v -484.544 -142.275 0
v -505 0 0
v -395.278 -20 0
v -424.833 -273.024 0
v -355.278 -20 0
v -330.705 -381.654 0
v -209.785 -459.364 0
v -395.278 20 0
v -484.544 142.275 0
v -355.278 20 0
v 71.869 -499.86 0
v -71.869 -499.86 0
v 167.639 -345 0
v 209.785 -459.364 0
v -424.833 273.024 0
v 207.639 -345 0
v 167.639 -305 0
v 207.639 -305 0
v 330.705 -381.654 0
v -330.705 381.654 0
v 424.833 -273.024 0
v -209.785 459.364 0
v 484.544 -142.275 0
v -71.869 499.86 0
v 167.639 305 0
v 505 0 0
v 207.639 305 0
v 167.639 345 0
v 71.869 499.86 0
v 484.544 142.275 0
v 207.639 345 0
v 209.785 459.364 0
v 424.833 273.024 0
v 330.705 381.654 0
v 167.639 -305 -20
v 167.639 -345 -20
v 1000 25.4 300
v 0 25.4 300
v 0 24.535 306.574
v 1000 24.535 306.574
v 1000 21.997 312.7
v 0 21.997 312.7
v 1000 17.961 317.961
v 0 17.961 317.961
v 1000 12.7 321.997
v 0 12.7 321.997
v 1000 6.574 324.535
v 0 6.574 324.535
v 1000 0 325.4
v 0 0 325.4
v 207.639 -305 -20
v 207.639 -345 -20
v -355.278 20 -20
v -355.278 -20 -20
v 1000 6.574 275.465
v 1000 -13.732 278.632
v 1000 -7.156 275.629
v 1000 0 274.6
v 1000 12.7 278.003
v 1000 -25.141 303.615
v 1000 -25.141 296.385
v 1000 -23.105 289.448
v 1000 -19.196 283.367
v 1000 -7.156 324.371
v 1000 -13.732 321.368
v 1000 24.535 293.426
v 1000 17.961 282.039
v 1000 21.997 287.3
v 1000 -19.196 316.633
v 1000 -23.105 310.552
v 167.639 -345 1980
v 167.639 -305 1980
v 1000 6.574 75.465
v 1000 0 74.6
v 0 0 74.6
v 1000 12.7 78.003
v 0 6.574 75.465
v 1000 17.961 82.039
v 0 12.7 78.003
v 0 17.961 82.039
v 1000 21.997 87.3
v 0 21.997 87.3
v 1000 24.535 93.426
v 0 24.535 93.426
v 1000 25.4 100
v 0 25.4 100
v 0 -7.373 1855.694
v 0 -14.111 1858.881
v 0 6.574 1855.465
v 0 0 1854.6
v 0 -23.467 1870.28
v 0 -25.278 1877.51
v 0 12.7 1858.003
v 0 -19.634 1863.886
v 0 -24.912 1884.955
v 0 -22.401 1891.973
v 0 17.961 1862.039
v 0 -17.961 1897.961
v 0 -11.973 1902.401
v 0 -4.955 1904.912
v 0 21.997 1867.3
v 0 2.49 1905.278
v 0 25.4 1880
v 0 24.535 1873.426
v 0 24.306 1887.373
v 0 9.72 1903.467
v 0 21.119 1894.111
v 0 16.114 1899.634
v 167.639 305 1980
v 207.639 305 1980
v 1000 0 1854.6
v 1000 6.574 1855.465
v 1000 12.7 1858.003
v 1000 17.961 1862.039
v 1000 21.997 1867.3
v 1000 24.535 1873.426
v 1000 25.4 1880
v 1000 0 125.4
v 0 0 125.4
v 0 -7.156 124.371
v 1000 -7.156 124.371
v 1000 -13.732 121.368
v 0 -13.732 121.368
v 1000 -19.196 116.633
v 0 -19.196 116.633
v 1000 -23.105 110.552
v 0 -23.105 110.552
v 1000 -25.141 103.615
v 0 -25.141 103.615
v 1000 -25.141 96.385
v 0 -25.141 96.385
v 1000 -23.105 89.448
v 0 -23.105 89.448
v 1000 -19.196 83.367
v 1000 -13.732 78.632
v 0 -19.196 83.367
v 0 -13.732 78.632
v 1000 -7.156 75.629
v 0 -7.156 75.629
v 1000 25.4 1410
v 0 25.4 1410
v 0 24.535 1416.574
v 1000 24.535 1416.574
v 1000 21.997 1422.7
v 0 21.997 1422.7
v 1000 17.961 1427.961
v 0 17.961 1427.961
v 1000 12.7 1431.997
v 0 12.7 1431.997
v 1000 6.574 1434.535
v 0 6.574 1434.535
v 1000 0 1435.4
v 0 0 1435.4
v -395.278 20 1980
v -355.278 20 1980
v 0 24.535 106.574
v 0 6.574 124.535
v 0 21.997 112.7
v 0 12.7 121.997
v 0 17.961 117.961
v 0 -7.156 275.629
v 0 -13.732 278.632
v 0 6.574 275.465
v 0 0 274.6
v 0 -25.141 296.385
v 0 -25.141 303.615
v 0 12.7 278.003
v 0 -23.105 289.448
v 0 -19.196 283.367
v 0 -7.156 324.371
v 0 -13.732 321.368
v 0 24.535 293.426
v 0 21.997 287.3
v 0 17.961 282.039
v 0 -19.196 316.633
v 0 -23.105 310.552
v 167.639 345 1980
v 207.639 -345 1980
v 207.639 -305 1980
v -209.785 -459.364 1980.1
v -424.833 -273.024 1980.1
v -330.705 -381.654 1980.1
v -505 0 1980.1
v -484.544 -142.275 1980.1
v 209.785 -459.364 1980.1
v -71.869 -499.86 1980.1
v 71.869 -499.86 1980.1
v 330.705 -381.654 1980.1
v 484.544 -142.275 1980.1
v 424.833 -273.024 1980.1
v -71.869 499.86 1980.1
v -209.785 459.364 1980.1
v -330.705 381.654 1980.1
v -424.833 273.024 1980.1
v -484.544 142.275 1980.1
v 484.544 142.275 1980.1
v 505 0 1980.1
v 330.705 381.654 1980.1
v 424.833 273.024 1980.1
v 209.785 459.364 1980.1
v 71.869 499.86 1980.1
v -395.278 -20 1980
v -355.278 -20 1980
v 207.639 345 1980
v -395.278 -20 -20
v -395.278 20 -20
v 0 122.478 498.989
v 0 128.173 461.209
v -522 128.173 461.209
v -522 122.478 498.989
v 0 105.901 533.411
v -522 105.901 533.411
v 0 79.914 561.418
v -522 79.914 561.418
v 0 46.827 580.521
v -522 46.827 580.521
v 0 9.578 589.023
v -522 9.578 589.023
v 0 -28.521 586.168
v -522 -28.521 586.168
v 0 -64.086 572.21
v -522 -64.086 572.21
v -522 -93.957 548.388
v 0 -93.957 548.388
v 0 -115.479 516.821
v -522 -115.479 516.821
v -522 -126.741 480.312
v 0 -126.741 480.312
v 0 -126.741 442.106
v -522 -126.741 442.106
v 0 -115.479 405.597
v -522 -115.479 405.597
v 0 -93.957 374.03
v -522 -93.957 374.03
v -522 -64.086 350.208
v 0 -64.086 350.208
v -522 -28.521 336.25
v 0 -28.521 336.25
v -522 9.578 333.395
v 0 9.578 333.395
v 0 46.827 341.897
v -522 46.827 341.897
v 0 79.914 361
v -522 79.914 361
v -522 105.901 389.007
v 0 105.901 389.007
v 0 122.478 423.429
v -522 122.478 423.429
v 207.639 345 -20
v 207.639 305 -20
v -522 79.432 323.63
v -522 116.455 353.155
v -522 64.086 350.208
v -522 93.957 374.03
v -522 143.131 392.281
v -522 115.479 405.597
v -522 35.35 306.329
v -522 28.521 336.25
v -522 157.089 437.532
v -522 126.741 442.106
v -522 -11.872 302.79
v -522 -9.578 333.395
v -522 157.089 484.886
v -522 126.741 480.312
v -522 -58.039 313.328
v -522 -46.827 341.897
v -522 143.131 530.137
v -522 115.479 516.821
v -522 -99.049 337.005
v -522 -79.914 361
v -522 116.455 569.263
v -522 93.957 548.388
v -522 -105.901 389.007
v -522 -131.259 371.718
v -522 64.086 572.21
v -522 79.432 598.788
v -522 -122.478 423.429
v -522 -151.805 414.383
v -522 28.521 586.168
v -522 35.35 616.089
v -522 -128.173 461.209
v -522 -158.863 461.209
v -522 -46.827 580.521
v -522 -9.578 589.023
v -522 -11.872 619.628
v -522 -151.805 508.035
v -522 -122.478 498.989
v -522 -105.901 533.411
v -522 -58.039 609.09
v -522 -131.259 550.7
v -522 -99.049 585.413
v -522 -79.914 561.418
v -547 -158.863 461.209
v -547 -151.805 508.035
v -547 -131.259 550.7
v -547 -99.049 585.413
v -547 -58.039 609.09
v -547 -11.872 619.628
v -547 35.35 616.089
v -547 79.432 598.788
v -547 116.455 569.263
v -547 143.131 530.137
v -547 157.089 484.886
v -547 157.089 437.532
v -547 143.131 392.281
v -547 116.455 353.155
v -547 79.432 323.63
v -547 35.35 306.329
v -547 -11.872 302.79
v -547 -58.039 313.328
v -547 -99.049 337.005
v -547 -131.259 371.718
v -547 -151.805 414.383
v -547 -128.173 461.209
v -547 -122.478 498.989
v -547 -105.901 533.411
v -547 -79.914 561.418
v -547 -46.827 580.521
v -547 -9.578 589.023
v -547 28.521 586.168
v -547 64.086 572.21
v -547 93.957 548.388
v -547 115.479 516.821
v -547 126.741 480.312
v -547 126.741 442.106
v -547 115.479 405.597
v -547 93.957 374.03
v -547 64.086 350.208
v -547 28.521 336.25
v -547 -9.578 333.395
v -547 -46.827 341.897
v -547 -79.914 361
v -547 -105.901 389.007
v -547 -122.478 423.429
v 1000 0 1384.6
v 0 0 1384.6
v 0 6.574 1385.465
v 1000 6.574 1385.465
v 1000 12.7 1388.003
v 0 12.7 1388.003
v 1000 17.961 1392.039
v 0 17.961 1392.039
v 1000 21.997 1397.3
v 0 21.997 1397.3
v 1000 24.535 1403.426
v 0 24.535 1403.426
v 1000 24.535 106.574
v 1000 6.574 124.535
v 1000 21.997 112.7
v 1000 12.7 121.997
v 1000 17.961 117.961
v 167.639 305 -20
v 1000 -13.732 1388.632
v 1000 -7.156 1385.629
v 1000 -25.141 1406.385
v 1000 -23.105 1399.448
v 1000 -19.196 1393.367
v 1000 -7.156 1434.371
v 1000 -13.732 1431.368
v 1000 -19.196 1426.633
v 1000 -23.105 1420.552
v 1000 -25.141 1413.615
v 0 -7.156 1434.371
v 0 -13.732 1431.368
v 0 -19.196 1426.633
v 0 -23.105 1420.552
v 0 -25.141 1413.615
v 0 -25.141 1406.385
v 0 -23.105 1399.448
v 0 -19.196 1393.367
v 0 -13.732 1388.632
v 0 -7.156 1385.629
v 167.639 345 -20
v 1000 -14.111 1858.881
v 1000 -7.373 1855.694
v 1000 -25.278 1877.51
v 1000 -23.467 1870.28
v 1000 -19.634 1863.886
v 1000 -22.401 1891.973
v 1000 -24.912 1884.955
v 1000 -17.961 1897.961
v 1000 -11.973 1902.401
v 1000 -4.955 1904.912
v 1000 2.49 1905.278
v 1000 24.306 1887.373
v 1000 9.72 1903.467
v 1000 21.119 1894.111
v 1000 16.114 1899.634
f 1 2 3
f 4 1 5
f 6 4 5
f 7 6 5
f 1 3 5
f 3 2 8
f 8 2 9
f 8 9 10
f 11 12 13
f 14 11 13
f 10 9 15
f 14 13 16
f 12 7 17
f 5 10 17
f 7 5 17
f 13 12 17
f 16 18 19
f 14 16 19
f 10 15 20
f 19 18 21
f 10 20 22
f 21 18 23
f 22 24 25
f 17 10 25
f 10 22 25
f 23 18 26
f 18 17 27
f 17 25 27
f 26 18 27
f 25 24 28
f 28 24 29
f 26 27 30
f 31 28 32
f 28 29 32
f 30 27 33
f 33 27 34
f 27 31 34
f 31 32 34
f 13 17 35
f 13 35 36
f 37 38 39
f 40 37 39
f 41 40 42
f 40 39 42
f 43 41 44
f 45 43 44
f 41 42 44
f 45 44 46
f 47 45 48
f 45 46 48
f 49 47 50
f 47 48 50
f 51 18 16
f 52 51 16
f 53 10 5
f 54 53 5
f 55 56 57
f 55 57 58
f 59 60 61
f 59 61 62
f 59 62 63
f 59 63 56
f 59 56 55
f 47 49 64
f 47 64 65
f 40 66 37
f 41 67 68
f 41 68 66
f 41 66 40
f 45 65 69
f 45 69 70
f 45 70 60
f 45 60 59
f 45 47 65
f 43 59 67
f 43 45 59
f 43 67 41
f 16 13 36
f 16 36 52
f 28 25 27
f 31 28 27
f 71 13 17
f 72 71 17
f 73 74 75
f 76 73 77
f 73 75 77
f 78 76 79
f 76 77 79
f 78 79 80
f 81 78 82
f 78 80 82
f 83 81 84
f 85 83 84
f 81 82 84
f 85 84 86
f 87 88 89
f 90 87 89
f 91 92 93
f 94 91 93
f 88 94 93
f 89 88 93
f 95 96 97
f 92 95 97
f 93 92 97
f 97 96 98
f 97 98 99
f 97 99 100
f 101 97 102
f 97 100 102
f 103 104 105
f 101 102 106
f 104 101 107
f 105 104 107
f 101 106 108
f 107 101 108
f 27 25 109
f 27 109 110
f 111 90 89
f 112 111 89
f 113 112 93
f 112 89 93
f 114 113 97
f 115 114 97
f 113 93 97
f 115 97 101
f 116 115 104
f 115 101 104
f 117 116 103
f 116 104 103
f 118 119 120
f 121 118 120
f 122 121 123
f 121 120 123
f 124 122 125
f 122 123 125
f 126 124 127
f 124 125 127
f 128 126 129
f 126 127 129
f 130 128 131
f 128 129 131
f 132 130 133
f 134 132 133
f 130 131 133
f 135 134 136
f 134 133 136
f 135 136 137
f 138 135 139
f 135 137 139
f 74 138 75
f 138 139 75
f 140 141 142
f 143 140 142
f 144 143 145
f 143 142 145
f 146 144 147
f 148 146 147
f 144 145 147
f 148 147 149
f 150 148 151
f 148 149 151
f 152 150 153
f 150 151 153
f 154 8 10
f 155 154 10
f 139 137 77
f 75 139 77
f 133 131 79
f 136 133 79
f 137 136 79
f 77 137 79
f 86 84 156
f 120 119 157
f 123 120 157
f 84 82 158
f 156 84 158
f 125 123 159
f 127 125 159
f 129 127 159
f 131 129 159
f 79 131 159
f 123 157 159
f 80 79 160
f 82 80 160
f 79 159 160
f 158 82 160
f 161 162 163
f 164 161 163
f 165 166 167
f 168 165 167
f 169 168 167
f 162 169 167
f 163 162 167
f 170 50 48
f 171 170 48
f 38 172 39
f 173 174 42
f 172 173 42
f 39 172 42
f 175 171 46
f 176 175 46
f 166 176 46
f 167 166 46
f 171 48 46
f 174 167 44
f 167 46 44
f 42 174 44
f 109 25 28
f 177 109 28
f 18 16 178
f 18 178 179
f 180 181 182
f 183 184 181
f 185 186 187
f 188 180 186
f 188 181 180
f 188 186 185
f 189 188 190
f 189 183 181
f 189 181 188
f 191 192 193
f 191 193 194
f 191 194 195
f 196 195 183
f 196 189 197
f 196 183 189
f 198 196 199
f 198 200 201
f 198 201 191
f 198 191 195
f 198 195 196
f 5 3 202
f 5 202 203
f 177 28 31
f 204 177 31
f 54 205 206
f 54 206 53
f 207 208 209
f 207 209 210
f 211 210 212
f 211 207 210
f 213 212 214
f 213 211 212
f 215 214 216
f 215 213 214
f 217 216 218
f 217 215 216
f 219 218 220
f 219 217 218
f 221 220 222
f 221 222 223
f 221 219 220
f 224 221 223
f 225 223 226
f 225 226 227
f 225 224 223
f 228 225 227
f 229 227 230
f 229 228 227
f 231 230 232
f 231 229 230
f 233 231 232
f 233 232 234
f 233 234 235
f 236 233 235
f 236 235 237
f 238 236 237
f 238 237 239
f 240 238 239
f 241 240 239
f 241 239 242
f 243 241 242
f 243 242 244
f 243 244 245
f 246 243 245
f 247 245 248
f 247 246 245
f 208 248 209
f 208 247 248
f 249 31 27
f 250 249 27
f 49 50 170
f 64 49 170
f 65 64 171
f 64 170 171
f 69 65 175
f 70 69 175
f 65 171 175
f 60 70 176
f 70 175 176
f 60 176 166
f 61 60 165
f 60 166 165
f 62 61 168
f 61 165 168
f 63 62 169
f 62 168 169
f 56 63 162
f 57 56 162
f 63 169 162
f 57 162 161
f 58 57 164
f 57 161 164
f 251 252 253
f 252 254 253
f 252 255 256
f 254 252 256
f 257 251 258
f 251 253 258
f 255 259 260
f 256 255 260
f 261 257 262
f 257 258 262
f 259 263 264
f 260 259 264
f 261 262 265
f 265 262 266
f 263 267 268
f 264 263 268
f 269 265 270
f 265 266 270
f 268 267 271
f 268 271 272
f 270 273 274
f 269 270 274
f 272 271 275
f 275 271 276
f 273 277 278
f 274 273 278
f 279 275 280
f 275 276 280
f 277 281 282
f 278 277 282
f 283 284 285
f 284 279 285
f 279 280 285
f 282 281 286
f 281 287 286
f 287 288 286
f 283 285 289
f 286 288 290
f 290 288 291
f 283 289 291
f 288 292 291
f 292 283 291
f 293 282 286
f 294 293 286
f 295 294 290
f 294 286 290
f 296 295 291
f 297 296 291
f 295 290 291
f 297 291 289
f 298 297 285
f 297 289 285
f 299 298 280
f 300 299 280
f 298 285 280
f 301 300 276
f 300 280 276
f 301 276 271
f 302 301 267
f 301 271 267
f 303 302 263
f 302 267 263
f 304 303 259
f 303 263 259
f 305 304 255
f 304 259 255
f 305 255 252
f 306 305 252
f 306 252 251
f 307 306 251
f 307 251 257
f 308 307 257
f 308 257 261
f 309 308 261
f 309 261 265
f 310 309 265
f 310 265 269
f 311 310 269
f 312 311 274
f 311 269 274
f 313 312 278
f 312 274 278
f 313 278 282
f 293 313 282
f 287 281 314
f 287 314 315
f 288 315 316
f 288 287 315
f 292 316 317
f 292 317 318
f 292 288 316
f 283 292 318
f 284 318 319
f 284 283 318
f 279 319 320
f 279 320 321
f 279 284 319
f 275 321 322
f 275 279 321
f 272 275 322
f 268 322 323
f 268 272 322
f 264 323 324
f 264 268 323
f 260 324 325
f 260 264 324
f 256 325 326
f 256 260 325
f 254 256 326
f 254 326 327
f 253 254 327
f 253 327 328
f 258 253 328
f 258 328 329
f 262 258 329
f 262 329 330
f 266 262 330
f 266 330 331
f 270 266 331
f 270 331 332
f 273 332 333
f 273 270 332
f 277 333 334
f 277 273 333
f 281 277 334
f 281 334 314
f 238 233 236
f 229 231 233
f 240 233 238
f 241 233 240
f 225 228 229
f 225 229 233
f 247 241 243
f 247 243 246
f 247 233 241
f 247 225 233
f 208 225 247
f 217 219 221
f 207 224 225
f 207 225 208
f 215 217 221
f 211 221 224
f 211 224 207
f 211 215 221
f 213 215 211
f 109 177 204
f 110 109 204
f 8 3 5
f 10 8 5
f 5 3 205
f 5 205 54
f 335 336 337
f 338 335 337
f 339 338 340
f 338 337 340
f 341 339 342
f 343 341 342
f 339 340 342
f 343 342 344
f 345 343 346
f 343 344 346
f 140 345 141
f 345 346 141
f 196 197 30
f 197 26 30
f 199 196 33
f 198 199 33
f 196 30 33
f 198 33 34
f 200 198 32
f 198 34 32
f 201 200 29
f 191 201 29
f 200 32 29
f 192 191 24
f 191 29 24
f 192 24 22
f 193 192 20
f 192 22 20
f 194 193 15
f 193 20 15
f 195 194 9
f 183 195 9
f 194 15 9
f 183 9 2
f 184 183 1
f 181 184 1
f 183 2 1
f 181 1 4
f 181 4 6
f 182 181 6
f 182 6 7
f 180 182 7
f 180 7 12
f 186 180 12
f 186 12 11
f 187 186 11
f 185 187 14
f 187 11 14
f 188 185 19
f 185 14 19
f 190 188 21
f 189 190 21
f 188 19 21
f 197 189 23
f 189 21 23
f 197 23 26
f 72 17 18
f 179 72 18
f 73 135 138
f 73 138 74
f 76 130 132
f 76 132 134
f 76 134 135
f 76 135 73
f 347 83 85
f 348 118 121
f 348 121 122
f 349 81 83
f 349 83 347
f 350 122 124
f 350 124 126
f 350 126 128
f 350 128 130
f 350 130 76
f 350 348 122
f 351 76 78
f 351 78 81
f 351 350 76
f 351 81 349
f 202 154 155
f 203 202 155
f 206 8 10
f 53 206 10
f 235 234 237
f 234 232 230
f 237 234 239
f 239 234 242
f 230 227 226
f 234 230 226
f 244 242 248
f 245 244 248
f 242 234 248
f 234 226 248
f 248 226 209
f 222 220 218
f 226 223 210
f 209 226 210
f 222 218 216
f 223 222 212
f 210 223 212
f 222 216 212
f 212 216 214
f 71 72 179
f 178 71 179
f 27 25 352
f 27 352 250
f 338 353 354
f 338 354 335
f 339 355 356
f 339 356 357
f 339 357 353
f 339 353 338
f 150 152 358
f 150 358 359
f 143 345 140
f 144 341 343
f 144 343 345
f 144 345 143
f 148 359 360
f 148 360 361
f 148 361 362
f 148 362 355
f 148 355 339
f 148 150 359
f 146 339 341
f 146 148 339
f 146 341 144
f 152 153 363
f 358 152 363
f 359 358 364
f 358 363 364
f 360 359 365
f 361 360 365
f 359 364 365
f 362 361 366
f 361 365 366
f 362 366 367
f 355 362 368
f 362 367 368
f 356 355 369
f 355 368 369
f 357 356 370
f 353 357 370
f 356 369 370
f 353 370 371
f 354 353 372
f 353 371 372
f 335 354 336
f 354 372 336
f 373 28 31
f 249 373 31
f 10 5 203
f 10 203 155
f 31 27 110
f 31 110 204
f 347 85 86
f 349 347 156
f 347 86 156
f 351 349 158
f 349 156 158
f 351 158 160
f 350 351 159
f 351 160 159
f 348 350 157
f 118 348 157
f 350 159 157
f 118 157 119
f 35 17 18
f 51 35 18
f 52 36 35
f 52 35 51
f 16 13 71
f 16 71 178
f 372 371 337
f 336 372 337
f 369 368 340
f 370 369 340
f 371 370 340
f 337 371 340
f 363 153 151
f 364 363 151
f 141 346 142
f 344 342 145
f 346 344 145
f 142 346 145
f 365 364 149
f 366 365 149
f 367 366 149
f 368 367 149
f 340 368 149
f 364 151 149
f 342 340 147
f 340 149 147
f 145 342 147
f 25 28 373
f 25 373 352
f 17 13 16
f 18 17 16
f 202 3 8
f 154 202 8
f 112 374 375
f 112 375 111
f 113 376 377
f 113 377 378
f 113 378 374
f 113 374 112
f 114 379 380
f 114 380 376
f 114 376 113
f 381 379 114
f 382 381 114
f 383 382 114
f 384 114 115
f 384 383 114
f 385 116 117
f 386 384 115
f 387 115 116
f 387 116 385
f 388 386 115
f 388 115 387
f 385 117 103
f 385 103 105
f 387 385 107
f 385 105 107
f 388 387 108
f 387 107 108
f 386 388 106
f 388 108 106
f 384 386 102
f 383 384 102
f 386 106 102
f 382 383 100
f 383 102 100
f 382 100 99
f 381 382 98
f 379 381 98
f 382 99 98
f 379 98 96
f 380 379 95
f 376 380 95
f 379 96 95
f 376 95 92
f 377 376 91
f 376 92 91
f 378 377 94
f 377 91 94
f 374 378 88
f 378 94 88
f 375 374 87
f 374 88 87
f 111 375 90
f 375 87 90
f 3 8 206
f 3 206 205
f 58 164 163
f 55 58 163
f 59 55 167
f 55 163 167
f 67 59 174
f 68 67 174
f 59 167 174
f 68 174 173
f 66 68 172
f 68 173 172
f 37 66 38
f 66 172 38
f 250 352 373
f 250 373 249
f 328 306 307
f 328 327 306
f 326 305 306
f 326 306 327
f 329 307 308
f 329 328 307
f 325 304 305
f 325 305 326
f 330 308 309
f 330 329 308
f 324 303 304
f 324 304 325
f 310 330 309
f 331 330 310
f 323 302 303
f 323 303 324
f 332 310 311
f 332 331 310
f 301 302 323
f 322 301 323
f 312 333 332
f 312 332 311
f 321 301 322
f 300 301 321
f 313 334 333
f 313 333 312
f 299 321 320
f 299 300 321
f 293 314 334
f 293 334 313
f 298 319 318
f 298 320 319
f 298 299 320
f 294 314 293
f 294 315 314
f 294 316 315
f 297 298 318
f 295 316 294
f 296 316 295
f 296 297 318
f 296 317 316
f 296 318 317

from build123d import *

# Parameters (mm, degrees)
F0_R      = 505
F0_W      = 40
F0_H      = 40
F1_DEPTH  = 1980
F3_DEPTH  = 1000
F4_W      = 40
F4_H      = 40
F5_DEPTH  = 20
F6_R      = 505
F7_DEPTH  = 0.1
F8_R      = 128.1725692129
F9_DEPTH  = 522
F10_R     = 158.8630507831
F10_R_2   = 128.1725692129
F11_DEPTH = 25


with BuildPart() as f1:
    # F0 (on Top) → F1 (new body)
    with BuildSketch(Plane.XY):
        Circle(F0_R)
        with Locations((187.6388374866, -325)):
            Rectangle(F0_W, F0_H, mode=Mode.SUBTRACT)
        with Locations((-375.2776749733, 0)):
            Rectangle(F0_W, F0_H, mode=Mode.SUBTRACT)
        with Locations((187.6388374866, 325)):
            Rectangle(F0_W, F0_H, mode=Mode.SUBTRACT)
    extrude(amount=F1_DEPTH)

    # F6 (on face) → F7 (join)
    with BuildSketch(Plane.XY.offset(1980)):
        Circle(F6_R)
    extrude(amount=F7_DEPTH)


with BuildPart() as f3:
    # F2 (on Right) → F3 (new body)
    with BuildSketch(Plane.YZ):
        with BuildLine():
            ThreePointArc((0, 125.4), (-25.4, 100), (0, 74.6))
            Line((0, 74.6), (0, 100))
            Line((0, 100), (0, 125.4))
        make_face()
        with BuildLine():
            Line((0, 100), (0, 74.6))
            ThreePointArc((0, 74.6), (17.9605122421, 82.0394877579), (25.4, 100))
            ThreePointArc((25.4, 100), (17.9605122421, 117.9605122421), (0, 125.4))
            Line((0, 125.4), (0, 100))
        make_face()
    extrude(amount=F3_DEPTH)


with BuildPart() as f3b:
    # F2 (on Right) → F3, piece 2 (new body)
    with BuildSketch(Plane.YZ):
        with BuildLine():
            ThreePointArc((0, 325.4), (-25.4, 300), (0, 274.6))
            Line((0, 274.6), (0, 300))
            Line((0, 300), (0, 325.4))
        make_face()
        with BuildLine():
            Line((0, 300), (0, 274.6))
            ThreePointArc((0, 274.6), (17.9605122421, 282.0394877579), (25.4, 300))
            ThreePointArc((25.4, 300), (17.9605122421, 317.9605122421), (0, 325.4))
            Line((0, 325.4), (0, 300))
        make_face()
    extrude(amount=F3_DEPTH)


with BuildPart() as f3c:
    # F2 (on Right) → F3, piece 3 (new body)
    with BuildSketch(Plane.YZ):
        with BuildLine():
            ThreePointArc((0, 1435.4), (-25.4, 1410), (0, 1384.6))
            Line((0, 1384.6), (0, 1410))
            Line((0, 1410), (0, 1435.4))
        make_face()
        with BuildLine():
            Line((0, 1410), (0, 1384.6))
            ThreePointArc((0, 1384.6), (17.9605122421, 1392.0394877579), (25.4, 1410))
            ThreePointArc((25.4, 1410), (17.9605122421, 1427.9605122421), (0, 1435.4))
            Line((0, 1435.4), (0, 1410))
        make_face()
    extrude(amount=F3_DEPTH)


with BuildPart() as f3d:
    # F2 (on Right) → F3, piece 4 (new body)
    with BuildSketch(Plane.YZ):
        with BuildLine():
            ThreePointArc((25.4, 1880), (-17.9605122421, 1897.9605122421), (0, 1854.6))
            ThreePointArc((0, 1854.6), (17.9605122421, 1862.0394877579), (25.4, 1880))
        make_face()
    extrude(amount=F3_DEPTH)


with BuildPart() as f5:
    # F4 (on face) → F5 (new body)
    with BuildSketch(Plane(origin=(0, 0, 0), x_dir=(1, 0, 0), z_dir=(0, 0, -1))):
        with Locations((187.6388374866, 325)):
            Rectangle(F4_W, F4_H)
    extrude(amount=F5_DEPTH)


with BuildPart() as f5b:
    # F4 (on face) → F5, piece 2 (new body)
    with BuildSketch(Plane(origin=(0, 0, 0), x_dir=(1, 0, 0), z_dir=(0, 0, -1))):
        with Locations((-375.2776749733, 0)):
            Rectangle(F4_W, F4_H)
    extrude(amount=F5_DEPTH)


with BuildPart() as f5c:
    # F4 (on face) → F5, piece 3 (new body)
    with BuildSketch(Plane(origin=(0, 0, 0), x_dir=(1, 0, 0), z_dir=(0, 0, -1))):
        with Locations((187.6388374866, -325)):
            Rectangle(F4_W, F4_H)
    extrude(amount=F5_DEPTH)


with BuildPart() as f9:
    # F8 (on Right) → F9 (new body)
    with BuildSketch(Plane.YZ):
        with Locations((0, 461.208999157)):
            Circle(F8_R)
    extrude(amount=-F9_DEPTH)


with BuildPart() as f11:
    # F10 (on face) → F11 (new body)
    with BuildSketch(Plane(origin=(-522, 0, 0), x_dir=(0, -1, 0), z_dir=(-1, 0, 0))):
        with Locations((0, 461.208999157)):
            Circle(F10_R)
        with Locations((0, 461.208999157)):
            Circle(F10_R_2, mode=Mode.SUBTRACT)
    extrude(amount=F11_DEPTH)


solid = Compound([f1.part, f3.part, f3b.part, f3c.part, f3d.part, f5.part, f5b.part, f5c.part, f9.part, f11.part])
